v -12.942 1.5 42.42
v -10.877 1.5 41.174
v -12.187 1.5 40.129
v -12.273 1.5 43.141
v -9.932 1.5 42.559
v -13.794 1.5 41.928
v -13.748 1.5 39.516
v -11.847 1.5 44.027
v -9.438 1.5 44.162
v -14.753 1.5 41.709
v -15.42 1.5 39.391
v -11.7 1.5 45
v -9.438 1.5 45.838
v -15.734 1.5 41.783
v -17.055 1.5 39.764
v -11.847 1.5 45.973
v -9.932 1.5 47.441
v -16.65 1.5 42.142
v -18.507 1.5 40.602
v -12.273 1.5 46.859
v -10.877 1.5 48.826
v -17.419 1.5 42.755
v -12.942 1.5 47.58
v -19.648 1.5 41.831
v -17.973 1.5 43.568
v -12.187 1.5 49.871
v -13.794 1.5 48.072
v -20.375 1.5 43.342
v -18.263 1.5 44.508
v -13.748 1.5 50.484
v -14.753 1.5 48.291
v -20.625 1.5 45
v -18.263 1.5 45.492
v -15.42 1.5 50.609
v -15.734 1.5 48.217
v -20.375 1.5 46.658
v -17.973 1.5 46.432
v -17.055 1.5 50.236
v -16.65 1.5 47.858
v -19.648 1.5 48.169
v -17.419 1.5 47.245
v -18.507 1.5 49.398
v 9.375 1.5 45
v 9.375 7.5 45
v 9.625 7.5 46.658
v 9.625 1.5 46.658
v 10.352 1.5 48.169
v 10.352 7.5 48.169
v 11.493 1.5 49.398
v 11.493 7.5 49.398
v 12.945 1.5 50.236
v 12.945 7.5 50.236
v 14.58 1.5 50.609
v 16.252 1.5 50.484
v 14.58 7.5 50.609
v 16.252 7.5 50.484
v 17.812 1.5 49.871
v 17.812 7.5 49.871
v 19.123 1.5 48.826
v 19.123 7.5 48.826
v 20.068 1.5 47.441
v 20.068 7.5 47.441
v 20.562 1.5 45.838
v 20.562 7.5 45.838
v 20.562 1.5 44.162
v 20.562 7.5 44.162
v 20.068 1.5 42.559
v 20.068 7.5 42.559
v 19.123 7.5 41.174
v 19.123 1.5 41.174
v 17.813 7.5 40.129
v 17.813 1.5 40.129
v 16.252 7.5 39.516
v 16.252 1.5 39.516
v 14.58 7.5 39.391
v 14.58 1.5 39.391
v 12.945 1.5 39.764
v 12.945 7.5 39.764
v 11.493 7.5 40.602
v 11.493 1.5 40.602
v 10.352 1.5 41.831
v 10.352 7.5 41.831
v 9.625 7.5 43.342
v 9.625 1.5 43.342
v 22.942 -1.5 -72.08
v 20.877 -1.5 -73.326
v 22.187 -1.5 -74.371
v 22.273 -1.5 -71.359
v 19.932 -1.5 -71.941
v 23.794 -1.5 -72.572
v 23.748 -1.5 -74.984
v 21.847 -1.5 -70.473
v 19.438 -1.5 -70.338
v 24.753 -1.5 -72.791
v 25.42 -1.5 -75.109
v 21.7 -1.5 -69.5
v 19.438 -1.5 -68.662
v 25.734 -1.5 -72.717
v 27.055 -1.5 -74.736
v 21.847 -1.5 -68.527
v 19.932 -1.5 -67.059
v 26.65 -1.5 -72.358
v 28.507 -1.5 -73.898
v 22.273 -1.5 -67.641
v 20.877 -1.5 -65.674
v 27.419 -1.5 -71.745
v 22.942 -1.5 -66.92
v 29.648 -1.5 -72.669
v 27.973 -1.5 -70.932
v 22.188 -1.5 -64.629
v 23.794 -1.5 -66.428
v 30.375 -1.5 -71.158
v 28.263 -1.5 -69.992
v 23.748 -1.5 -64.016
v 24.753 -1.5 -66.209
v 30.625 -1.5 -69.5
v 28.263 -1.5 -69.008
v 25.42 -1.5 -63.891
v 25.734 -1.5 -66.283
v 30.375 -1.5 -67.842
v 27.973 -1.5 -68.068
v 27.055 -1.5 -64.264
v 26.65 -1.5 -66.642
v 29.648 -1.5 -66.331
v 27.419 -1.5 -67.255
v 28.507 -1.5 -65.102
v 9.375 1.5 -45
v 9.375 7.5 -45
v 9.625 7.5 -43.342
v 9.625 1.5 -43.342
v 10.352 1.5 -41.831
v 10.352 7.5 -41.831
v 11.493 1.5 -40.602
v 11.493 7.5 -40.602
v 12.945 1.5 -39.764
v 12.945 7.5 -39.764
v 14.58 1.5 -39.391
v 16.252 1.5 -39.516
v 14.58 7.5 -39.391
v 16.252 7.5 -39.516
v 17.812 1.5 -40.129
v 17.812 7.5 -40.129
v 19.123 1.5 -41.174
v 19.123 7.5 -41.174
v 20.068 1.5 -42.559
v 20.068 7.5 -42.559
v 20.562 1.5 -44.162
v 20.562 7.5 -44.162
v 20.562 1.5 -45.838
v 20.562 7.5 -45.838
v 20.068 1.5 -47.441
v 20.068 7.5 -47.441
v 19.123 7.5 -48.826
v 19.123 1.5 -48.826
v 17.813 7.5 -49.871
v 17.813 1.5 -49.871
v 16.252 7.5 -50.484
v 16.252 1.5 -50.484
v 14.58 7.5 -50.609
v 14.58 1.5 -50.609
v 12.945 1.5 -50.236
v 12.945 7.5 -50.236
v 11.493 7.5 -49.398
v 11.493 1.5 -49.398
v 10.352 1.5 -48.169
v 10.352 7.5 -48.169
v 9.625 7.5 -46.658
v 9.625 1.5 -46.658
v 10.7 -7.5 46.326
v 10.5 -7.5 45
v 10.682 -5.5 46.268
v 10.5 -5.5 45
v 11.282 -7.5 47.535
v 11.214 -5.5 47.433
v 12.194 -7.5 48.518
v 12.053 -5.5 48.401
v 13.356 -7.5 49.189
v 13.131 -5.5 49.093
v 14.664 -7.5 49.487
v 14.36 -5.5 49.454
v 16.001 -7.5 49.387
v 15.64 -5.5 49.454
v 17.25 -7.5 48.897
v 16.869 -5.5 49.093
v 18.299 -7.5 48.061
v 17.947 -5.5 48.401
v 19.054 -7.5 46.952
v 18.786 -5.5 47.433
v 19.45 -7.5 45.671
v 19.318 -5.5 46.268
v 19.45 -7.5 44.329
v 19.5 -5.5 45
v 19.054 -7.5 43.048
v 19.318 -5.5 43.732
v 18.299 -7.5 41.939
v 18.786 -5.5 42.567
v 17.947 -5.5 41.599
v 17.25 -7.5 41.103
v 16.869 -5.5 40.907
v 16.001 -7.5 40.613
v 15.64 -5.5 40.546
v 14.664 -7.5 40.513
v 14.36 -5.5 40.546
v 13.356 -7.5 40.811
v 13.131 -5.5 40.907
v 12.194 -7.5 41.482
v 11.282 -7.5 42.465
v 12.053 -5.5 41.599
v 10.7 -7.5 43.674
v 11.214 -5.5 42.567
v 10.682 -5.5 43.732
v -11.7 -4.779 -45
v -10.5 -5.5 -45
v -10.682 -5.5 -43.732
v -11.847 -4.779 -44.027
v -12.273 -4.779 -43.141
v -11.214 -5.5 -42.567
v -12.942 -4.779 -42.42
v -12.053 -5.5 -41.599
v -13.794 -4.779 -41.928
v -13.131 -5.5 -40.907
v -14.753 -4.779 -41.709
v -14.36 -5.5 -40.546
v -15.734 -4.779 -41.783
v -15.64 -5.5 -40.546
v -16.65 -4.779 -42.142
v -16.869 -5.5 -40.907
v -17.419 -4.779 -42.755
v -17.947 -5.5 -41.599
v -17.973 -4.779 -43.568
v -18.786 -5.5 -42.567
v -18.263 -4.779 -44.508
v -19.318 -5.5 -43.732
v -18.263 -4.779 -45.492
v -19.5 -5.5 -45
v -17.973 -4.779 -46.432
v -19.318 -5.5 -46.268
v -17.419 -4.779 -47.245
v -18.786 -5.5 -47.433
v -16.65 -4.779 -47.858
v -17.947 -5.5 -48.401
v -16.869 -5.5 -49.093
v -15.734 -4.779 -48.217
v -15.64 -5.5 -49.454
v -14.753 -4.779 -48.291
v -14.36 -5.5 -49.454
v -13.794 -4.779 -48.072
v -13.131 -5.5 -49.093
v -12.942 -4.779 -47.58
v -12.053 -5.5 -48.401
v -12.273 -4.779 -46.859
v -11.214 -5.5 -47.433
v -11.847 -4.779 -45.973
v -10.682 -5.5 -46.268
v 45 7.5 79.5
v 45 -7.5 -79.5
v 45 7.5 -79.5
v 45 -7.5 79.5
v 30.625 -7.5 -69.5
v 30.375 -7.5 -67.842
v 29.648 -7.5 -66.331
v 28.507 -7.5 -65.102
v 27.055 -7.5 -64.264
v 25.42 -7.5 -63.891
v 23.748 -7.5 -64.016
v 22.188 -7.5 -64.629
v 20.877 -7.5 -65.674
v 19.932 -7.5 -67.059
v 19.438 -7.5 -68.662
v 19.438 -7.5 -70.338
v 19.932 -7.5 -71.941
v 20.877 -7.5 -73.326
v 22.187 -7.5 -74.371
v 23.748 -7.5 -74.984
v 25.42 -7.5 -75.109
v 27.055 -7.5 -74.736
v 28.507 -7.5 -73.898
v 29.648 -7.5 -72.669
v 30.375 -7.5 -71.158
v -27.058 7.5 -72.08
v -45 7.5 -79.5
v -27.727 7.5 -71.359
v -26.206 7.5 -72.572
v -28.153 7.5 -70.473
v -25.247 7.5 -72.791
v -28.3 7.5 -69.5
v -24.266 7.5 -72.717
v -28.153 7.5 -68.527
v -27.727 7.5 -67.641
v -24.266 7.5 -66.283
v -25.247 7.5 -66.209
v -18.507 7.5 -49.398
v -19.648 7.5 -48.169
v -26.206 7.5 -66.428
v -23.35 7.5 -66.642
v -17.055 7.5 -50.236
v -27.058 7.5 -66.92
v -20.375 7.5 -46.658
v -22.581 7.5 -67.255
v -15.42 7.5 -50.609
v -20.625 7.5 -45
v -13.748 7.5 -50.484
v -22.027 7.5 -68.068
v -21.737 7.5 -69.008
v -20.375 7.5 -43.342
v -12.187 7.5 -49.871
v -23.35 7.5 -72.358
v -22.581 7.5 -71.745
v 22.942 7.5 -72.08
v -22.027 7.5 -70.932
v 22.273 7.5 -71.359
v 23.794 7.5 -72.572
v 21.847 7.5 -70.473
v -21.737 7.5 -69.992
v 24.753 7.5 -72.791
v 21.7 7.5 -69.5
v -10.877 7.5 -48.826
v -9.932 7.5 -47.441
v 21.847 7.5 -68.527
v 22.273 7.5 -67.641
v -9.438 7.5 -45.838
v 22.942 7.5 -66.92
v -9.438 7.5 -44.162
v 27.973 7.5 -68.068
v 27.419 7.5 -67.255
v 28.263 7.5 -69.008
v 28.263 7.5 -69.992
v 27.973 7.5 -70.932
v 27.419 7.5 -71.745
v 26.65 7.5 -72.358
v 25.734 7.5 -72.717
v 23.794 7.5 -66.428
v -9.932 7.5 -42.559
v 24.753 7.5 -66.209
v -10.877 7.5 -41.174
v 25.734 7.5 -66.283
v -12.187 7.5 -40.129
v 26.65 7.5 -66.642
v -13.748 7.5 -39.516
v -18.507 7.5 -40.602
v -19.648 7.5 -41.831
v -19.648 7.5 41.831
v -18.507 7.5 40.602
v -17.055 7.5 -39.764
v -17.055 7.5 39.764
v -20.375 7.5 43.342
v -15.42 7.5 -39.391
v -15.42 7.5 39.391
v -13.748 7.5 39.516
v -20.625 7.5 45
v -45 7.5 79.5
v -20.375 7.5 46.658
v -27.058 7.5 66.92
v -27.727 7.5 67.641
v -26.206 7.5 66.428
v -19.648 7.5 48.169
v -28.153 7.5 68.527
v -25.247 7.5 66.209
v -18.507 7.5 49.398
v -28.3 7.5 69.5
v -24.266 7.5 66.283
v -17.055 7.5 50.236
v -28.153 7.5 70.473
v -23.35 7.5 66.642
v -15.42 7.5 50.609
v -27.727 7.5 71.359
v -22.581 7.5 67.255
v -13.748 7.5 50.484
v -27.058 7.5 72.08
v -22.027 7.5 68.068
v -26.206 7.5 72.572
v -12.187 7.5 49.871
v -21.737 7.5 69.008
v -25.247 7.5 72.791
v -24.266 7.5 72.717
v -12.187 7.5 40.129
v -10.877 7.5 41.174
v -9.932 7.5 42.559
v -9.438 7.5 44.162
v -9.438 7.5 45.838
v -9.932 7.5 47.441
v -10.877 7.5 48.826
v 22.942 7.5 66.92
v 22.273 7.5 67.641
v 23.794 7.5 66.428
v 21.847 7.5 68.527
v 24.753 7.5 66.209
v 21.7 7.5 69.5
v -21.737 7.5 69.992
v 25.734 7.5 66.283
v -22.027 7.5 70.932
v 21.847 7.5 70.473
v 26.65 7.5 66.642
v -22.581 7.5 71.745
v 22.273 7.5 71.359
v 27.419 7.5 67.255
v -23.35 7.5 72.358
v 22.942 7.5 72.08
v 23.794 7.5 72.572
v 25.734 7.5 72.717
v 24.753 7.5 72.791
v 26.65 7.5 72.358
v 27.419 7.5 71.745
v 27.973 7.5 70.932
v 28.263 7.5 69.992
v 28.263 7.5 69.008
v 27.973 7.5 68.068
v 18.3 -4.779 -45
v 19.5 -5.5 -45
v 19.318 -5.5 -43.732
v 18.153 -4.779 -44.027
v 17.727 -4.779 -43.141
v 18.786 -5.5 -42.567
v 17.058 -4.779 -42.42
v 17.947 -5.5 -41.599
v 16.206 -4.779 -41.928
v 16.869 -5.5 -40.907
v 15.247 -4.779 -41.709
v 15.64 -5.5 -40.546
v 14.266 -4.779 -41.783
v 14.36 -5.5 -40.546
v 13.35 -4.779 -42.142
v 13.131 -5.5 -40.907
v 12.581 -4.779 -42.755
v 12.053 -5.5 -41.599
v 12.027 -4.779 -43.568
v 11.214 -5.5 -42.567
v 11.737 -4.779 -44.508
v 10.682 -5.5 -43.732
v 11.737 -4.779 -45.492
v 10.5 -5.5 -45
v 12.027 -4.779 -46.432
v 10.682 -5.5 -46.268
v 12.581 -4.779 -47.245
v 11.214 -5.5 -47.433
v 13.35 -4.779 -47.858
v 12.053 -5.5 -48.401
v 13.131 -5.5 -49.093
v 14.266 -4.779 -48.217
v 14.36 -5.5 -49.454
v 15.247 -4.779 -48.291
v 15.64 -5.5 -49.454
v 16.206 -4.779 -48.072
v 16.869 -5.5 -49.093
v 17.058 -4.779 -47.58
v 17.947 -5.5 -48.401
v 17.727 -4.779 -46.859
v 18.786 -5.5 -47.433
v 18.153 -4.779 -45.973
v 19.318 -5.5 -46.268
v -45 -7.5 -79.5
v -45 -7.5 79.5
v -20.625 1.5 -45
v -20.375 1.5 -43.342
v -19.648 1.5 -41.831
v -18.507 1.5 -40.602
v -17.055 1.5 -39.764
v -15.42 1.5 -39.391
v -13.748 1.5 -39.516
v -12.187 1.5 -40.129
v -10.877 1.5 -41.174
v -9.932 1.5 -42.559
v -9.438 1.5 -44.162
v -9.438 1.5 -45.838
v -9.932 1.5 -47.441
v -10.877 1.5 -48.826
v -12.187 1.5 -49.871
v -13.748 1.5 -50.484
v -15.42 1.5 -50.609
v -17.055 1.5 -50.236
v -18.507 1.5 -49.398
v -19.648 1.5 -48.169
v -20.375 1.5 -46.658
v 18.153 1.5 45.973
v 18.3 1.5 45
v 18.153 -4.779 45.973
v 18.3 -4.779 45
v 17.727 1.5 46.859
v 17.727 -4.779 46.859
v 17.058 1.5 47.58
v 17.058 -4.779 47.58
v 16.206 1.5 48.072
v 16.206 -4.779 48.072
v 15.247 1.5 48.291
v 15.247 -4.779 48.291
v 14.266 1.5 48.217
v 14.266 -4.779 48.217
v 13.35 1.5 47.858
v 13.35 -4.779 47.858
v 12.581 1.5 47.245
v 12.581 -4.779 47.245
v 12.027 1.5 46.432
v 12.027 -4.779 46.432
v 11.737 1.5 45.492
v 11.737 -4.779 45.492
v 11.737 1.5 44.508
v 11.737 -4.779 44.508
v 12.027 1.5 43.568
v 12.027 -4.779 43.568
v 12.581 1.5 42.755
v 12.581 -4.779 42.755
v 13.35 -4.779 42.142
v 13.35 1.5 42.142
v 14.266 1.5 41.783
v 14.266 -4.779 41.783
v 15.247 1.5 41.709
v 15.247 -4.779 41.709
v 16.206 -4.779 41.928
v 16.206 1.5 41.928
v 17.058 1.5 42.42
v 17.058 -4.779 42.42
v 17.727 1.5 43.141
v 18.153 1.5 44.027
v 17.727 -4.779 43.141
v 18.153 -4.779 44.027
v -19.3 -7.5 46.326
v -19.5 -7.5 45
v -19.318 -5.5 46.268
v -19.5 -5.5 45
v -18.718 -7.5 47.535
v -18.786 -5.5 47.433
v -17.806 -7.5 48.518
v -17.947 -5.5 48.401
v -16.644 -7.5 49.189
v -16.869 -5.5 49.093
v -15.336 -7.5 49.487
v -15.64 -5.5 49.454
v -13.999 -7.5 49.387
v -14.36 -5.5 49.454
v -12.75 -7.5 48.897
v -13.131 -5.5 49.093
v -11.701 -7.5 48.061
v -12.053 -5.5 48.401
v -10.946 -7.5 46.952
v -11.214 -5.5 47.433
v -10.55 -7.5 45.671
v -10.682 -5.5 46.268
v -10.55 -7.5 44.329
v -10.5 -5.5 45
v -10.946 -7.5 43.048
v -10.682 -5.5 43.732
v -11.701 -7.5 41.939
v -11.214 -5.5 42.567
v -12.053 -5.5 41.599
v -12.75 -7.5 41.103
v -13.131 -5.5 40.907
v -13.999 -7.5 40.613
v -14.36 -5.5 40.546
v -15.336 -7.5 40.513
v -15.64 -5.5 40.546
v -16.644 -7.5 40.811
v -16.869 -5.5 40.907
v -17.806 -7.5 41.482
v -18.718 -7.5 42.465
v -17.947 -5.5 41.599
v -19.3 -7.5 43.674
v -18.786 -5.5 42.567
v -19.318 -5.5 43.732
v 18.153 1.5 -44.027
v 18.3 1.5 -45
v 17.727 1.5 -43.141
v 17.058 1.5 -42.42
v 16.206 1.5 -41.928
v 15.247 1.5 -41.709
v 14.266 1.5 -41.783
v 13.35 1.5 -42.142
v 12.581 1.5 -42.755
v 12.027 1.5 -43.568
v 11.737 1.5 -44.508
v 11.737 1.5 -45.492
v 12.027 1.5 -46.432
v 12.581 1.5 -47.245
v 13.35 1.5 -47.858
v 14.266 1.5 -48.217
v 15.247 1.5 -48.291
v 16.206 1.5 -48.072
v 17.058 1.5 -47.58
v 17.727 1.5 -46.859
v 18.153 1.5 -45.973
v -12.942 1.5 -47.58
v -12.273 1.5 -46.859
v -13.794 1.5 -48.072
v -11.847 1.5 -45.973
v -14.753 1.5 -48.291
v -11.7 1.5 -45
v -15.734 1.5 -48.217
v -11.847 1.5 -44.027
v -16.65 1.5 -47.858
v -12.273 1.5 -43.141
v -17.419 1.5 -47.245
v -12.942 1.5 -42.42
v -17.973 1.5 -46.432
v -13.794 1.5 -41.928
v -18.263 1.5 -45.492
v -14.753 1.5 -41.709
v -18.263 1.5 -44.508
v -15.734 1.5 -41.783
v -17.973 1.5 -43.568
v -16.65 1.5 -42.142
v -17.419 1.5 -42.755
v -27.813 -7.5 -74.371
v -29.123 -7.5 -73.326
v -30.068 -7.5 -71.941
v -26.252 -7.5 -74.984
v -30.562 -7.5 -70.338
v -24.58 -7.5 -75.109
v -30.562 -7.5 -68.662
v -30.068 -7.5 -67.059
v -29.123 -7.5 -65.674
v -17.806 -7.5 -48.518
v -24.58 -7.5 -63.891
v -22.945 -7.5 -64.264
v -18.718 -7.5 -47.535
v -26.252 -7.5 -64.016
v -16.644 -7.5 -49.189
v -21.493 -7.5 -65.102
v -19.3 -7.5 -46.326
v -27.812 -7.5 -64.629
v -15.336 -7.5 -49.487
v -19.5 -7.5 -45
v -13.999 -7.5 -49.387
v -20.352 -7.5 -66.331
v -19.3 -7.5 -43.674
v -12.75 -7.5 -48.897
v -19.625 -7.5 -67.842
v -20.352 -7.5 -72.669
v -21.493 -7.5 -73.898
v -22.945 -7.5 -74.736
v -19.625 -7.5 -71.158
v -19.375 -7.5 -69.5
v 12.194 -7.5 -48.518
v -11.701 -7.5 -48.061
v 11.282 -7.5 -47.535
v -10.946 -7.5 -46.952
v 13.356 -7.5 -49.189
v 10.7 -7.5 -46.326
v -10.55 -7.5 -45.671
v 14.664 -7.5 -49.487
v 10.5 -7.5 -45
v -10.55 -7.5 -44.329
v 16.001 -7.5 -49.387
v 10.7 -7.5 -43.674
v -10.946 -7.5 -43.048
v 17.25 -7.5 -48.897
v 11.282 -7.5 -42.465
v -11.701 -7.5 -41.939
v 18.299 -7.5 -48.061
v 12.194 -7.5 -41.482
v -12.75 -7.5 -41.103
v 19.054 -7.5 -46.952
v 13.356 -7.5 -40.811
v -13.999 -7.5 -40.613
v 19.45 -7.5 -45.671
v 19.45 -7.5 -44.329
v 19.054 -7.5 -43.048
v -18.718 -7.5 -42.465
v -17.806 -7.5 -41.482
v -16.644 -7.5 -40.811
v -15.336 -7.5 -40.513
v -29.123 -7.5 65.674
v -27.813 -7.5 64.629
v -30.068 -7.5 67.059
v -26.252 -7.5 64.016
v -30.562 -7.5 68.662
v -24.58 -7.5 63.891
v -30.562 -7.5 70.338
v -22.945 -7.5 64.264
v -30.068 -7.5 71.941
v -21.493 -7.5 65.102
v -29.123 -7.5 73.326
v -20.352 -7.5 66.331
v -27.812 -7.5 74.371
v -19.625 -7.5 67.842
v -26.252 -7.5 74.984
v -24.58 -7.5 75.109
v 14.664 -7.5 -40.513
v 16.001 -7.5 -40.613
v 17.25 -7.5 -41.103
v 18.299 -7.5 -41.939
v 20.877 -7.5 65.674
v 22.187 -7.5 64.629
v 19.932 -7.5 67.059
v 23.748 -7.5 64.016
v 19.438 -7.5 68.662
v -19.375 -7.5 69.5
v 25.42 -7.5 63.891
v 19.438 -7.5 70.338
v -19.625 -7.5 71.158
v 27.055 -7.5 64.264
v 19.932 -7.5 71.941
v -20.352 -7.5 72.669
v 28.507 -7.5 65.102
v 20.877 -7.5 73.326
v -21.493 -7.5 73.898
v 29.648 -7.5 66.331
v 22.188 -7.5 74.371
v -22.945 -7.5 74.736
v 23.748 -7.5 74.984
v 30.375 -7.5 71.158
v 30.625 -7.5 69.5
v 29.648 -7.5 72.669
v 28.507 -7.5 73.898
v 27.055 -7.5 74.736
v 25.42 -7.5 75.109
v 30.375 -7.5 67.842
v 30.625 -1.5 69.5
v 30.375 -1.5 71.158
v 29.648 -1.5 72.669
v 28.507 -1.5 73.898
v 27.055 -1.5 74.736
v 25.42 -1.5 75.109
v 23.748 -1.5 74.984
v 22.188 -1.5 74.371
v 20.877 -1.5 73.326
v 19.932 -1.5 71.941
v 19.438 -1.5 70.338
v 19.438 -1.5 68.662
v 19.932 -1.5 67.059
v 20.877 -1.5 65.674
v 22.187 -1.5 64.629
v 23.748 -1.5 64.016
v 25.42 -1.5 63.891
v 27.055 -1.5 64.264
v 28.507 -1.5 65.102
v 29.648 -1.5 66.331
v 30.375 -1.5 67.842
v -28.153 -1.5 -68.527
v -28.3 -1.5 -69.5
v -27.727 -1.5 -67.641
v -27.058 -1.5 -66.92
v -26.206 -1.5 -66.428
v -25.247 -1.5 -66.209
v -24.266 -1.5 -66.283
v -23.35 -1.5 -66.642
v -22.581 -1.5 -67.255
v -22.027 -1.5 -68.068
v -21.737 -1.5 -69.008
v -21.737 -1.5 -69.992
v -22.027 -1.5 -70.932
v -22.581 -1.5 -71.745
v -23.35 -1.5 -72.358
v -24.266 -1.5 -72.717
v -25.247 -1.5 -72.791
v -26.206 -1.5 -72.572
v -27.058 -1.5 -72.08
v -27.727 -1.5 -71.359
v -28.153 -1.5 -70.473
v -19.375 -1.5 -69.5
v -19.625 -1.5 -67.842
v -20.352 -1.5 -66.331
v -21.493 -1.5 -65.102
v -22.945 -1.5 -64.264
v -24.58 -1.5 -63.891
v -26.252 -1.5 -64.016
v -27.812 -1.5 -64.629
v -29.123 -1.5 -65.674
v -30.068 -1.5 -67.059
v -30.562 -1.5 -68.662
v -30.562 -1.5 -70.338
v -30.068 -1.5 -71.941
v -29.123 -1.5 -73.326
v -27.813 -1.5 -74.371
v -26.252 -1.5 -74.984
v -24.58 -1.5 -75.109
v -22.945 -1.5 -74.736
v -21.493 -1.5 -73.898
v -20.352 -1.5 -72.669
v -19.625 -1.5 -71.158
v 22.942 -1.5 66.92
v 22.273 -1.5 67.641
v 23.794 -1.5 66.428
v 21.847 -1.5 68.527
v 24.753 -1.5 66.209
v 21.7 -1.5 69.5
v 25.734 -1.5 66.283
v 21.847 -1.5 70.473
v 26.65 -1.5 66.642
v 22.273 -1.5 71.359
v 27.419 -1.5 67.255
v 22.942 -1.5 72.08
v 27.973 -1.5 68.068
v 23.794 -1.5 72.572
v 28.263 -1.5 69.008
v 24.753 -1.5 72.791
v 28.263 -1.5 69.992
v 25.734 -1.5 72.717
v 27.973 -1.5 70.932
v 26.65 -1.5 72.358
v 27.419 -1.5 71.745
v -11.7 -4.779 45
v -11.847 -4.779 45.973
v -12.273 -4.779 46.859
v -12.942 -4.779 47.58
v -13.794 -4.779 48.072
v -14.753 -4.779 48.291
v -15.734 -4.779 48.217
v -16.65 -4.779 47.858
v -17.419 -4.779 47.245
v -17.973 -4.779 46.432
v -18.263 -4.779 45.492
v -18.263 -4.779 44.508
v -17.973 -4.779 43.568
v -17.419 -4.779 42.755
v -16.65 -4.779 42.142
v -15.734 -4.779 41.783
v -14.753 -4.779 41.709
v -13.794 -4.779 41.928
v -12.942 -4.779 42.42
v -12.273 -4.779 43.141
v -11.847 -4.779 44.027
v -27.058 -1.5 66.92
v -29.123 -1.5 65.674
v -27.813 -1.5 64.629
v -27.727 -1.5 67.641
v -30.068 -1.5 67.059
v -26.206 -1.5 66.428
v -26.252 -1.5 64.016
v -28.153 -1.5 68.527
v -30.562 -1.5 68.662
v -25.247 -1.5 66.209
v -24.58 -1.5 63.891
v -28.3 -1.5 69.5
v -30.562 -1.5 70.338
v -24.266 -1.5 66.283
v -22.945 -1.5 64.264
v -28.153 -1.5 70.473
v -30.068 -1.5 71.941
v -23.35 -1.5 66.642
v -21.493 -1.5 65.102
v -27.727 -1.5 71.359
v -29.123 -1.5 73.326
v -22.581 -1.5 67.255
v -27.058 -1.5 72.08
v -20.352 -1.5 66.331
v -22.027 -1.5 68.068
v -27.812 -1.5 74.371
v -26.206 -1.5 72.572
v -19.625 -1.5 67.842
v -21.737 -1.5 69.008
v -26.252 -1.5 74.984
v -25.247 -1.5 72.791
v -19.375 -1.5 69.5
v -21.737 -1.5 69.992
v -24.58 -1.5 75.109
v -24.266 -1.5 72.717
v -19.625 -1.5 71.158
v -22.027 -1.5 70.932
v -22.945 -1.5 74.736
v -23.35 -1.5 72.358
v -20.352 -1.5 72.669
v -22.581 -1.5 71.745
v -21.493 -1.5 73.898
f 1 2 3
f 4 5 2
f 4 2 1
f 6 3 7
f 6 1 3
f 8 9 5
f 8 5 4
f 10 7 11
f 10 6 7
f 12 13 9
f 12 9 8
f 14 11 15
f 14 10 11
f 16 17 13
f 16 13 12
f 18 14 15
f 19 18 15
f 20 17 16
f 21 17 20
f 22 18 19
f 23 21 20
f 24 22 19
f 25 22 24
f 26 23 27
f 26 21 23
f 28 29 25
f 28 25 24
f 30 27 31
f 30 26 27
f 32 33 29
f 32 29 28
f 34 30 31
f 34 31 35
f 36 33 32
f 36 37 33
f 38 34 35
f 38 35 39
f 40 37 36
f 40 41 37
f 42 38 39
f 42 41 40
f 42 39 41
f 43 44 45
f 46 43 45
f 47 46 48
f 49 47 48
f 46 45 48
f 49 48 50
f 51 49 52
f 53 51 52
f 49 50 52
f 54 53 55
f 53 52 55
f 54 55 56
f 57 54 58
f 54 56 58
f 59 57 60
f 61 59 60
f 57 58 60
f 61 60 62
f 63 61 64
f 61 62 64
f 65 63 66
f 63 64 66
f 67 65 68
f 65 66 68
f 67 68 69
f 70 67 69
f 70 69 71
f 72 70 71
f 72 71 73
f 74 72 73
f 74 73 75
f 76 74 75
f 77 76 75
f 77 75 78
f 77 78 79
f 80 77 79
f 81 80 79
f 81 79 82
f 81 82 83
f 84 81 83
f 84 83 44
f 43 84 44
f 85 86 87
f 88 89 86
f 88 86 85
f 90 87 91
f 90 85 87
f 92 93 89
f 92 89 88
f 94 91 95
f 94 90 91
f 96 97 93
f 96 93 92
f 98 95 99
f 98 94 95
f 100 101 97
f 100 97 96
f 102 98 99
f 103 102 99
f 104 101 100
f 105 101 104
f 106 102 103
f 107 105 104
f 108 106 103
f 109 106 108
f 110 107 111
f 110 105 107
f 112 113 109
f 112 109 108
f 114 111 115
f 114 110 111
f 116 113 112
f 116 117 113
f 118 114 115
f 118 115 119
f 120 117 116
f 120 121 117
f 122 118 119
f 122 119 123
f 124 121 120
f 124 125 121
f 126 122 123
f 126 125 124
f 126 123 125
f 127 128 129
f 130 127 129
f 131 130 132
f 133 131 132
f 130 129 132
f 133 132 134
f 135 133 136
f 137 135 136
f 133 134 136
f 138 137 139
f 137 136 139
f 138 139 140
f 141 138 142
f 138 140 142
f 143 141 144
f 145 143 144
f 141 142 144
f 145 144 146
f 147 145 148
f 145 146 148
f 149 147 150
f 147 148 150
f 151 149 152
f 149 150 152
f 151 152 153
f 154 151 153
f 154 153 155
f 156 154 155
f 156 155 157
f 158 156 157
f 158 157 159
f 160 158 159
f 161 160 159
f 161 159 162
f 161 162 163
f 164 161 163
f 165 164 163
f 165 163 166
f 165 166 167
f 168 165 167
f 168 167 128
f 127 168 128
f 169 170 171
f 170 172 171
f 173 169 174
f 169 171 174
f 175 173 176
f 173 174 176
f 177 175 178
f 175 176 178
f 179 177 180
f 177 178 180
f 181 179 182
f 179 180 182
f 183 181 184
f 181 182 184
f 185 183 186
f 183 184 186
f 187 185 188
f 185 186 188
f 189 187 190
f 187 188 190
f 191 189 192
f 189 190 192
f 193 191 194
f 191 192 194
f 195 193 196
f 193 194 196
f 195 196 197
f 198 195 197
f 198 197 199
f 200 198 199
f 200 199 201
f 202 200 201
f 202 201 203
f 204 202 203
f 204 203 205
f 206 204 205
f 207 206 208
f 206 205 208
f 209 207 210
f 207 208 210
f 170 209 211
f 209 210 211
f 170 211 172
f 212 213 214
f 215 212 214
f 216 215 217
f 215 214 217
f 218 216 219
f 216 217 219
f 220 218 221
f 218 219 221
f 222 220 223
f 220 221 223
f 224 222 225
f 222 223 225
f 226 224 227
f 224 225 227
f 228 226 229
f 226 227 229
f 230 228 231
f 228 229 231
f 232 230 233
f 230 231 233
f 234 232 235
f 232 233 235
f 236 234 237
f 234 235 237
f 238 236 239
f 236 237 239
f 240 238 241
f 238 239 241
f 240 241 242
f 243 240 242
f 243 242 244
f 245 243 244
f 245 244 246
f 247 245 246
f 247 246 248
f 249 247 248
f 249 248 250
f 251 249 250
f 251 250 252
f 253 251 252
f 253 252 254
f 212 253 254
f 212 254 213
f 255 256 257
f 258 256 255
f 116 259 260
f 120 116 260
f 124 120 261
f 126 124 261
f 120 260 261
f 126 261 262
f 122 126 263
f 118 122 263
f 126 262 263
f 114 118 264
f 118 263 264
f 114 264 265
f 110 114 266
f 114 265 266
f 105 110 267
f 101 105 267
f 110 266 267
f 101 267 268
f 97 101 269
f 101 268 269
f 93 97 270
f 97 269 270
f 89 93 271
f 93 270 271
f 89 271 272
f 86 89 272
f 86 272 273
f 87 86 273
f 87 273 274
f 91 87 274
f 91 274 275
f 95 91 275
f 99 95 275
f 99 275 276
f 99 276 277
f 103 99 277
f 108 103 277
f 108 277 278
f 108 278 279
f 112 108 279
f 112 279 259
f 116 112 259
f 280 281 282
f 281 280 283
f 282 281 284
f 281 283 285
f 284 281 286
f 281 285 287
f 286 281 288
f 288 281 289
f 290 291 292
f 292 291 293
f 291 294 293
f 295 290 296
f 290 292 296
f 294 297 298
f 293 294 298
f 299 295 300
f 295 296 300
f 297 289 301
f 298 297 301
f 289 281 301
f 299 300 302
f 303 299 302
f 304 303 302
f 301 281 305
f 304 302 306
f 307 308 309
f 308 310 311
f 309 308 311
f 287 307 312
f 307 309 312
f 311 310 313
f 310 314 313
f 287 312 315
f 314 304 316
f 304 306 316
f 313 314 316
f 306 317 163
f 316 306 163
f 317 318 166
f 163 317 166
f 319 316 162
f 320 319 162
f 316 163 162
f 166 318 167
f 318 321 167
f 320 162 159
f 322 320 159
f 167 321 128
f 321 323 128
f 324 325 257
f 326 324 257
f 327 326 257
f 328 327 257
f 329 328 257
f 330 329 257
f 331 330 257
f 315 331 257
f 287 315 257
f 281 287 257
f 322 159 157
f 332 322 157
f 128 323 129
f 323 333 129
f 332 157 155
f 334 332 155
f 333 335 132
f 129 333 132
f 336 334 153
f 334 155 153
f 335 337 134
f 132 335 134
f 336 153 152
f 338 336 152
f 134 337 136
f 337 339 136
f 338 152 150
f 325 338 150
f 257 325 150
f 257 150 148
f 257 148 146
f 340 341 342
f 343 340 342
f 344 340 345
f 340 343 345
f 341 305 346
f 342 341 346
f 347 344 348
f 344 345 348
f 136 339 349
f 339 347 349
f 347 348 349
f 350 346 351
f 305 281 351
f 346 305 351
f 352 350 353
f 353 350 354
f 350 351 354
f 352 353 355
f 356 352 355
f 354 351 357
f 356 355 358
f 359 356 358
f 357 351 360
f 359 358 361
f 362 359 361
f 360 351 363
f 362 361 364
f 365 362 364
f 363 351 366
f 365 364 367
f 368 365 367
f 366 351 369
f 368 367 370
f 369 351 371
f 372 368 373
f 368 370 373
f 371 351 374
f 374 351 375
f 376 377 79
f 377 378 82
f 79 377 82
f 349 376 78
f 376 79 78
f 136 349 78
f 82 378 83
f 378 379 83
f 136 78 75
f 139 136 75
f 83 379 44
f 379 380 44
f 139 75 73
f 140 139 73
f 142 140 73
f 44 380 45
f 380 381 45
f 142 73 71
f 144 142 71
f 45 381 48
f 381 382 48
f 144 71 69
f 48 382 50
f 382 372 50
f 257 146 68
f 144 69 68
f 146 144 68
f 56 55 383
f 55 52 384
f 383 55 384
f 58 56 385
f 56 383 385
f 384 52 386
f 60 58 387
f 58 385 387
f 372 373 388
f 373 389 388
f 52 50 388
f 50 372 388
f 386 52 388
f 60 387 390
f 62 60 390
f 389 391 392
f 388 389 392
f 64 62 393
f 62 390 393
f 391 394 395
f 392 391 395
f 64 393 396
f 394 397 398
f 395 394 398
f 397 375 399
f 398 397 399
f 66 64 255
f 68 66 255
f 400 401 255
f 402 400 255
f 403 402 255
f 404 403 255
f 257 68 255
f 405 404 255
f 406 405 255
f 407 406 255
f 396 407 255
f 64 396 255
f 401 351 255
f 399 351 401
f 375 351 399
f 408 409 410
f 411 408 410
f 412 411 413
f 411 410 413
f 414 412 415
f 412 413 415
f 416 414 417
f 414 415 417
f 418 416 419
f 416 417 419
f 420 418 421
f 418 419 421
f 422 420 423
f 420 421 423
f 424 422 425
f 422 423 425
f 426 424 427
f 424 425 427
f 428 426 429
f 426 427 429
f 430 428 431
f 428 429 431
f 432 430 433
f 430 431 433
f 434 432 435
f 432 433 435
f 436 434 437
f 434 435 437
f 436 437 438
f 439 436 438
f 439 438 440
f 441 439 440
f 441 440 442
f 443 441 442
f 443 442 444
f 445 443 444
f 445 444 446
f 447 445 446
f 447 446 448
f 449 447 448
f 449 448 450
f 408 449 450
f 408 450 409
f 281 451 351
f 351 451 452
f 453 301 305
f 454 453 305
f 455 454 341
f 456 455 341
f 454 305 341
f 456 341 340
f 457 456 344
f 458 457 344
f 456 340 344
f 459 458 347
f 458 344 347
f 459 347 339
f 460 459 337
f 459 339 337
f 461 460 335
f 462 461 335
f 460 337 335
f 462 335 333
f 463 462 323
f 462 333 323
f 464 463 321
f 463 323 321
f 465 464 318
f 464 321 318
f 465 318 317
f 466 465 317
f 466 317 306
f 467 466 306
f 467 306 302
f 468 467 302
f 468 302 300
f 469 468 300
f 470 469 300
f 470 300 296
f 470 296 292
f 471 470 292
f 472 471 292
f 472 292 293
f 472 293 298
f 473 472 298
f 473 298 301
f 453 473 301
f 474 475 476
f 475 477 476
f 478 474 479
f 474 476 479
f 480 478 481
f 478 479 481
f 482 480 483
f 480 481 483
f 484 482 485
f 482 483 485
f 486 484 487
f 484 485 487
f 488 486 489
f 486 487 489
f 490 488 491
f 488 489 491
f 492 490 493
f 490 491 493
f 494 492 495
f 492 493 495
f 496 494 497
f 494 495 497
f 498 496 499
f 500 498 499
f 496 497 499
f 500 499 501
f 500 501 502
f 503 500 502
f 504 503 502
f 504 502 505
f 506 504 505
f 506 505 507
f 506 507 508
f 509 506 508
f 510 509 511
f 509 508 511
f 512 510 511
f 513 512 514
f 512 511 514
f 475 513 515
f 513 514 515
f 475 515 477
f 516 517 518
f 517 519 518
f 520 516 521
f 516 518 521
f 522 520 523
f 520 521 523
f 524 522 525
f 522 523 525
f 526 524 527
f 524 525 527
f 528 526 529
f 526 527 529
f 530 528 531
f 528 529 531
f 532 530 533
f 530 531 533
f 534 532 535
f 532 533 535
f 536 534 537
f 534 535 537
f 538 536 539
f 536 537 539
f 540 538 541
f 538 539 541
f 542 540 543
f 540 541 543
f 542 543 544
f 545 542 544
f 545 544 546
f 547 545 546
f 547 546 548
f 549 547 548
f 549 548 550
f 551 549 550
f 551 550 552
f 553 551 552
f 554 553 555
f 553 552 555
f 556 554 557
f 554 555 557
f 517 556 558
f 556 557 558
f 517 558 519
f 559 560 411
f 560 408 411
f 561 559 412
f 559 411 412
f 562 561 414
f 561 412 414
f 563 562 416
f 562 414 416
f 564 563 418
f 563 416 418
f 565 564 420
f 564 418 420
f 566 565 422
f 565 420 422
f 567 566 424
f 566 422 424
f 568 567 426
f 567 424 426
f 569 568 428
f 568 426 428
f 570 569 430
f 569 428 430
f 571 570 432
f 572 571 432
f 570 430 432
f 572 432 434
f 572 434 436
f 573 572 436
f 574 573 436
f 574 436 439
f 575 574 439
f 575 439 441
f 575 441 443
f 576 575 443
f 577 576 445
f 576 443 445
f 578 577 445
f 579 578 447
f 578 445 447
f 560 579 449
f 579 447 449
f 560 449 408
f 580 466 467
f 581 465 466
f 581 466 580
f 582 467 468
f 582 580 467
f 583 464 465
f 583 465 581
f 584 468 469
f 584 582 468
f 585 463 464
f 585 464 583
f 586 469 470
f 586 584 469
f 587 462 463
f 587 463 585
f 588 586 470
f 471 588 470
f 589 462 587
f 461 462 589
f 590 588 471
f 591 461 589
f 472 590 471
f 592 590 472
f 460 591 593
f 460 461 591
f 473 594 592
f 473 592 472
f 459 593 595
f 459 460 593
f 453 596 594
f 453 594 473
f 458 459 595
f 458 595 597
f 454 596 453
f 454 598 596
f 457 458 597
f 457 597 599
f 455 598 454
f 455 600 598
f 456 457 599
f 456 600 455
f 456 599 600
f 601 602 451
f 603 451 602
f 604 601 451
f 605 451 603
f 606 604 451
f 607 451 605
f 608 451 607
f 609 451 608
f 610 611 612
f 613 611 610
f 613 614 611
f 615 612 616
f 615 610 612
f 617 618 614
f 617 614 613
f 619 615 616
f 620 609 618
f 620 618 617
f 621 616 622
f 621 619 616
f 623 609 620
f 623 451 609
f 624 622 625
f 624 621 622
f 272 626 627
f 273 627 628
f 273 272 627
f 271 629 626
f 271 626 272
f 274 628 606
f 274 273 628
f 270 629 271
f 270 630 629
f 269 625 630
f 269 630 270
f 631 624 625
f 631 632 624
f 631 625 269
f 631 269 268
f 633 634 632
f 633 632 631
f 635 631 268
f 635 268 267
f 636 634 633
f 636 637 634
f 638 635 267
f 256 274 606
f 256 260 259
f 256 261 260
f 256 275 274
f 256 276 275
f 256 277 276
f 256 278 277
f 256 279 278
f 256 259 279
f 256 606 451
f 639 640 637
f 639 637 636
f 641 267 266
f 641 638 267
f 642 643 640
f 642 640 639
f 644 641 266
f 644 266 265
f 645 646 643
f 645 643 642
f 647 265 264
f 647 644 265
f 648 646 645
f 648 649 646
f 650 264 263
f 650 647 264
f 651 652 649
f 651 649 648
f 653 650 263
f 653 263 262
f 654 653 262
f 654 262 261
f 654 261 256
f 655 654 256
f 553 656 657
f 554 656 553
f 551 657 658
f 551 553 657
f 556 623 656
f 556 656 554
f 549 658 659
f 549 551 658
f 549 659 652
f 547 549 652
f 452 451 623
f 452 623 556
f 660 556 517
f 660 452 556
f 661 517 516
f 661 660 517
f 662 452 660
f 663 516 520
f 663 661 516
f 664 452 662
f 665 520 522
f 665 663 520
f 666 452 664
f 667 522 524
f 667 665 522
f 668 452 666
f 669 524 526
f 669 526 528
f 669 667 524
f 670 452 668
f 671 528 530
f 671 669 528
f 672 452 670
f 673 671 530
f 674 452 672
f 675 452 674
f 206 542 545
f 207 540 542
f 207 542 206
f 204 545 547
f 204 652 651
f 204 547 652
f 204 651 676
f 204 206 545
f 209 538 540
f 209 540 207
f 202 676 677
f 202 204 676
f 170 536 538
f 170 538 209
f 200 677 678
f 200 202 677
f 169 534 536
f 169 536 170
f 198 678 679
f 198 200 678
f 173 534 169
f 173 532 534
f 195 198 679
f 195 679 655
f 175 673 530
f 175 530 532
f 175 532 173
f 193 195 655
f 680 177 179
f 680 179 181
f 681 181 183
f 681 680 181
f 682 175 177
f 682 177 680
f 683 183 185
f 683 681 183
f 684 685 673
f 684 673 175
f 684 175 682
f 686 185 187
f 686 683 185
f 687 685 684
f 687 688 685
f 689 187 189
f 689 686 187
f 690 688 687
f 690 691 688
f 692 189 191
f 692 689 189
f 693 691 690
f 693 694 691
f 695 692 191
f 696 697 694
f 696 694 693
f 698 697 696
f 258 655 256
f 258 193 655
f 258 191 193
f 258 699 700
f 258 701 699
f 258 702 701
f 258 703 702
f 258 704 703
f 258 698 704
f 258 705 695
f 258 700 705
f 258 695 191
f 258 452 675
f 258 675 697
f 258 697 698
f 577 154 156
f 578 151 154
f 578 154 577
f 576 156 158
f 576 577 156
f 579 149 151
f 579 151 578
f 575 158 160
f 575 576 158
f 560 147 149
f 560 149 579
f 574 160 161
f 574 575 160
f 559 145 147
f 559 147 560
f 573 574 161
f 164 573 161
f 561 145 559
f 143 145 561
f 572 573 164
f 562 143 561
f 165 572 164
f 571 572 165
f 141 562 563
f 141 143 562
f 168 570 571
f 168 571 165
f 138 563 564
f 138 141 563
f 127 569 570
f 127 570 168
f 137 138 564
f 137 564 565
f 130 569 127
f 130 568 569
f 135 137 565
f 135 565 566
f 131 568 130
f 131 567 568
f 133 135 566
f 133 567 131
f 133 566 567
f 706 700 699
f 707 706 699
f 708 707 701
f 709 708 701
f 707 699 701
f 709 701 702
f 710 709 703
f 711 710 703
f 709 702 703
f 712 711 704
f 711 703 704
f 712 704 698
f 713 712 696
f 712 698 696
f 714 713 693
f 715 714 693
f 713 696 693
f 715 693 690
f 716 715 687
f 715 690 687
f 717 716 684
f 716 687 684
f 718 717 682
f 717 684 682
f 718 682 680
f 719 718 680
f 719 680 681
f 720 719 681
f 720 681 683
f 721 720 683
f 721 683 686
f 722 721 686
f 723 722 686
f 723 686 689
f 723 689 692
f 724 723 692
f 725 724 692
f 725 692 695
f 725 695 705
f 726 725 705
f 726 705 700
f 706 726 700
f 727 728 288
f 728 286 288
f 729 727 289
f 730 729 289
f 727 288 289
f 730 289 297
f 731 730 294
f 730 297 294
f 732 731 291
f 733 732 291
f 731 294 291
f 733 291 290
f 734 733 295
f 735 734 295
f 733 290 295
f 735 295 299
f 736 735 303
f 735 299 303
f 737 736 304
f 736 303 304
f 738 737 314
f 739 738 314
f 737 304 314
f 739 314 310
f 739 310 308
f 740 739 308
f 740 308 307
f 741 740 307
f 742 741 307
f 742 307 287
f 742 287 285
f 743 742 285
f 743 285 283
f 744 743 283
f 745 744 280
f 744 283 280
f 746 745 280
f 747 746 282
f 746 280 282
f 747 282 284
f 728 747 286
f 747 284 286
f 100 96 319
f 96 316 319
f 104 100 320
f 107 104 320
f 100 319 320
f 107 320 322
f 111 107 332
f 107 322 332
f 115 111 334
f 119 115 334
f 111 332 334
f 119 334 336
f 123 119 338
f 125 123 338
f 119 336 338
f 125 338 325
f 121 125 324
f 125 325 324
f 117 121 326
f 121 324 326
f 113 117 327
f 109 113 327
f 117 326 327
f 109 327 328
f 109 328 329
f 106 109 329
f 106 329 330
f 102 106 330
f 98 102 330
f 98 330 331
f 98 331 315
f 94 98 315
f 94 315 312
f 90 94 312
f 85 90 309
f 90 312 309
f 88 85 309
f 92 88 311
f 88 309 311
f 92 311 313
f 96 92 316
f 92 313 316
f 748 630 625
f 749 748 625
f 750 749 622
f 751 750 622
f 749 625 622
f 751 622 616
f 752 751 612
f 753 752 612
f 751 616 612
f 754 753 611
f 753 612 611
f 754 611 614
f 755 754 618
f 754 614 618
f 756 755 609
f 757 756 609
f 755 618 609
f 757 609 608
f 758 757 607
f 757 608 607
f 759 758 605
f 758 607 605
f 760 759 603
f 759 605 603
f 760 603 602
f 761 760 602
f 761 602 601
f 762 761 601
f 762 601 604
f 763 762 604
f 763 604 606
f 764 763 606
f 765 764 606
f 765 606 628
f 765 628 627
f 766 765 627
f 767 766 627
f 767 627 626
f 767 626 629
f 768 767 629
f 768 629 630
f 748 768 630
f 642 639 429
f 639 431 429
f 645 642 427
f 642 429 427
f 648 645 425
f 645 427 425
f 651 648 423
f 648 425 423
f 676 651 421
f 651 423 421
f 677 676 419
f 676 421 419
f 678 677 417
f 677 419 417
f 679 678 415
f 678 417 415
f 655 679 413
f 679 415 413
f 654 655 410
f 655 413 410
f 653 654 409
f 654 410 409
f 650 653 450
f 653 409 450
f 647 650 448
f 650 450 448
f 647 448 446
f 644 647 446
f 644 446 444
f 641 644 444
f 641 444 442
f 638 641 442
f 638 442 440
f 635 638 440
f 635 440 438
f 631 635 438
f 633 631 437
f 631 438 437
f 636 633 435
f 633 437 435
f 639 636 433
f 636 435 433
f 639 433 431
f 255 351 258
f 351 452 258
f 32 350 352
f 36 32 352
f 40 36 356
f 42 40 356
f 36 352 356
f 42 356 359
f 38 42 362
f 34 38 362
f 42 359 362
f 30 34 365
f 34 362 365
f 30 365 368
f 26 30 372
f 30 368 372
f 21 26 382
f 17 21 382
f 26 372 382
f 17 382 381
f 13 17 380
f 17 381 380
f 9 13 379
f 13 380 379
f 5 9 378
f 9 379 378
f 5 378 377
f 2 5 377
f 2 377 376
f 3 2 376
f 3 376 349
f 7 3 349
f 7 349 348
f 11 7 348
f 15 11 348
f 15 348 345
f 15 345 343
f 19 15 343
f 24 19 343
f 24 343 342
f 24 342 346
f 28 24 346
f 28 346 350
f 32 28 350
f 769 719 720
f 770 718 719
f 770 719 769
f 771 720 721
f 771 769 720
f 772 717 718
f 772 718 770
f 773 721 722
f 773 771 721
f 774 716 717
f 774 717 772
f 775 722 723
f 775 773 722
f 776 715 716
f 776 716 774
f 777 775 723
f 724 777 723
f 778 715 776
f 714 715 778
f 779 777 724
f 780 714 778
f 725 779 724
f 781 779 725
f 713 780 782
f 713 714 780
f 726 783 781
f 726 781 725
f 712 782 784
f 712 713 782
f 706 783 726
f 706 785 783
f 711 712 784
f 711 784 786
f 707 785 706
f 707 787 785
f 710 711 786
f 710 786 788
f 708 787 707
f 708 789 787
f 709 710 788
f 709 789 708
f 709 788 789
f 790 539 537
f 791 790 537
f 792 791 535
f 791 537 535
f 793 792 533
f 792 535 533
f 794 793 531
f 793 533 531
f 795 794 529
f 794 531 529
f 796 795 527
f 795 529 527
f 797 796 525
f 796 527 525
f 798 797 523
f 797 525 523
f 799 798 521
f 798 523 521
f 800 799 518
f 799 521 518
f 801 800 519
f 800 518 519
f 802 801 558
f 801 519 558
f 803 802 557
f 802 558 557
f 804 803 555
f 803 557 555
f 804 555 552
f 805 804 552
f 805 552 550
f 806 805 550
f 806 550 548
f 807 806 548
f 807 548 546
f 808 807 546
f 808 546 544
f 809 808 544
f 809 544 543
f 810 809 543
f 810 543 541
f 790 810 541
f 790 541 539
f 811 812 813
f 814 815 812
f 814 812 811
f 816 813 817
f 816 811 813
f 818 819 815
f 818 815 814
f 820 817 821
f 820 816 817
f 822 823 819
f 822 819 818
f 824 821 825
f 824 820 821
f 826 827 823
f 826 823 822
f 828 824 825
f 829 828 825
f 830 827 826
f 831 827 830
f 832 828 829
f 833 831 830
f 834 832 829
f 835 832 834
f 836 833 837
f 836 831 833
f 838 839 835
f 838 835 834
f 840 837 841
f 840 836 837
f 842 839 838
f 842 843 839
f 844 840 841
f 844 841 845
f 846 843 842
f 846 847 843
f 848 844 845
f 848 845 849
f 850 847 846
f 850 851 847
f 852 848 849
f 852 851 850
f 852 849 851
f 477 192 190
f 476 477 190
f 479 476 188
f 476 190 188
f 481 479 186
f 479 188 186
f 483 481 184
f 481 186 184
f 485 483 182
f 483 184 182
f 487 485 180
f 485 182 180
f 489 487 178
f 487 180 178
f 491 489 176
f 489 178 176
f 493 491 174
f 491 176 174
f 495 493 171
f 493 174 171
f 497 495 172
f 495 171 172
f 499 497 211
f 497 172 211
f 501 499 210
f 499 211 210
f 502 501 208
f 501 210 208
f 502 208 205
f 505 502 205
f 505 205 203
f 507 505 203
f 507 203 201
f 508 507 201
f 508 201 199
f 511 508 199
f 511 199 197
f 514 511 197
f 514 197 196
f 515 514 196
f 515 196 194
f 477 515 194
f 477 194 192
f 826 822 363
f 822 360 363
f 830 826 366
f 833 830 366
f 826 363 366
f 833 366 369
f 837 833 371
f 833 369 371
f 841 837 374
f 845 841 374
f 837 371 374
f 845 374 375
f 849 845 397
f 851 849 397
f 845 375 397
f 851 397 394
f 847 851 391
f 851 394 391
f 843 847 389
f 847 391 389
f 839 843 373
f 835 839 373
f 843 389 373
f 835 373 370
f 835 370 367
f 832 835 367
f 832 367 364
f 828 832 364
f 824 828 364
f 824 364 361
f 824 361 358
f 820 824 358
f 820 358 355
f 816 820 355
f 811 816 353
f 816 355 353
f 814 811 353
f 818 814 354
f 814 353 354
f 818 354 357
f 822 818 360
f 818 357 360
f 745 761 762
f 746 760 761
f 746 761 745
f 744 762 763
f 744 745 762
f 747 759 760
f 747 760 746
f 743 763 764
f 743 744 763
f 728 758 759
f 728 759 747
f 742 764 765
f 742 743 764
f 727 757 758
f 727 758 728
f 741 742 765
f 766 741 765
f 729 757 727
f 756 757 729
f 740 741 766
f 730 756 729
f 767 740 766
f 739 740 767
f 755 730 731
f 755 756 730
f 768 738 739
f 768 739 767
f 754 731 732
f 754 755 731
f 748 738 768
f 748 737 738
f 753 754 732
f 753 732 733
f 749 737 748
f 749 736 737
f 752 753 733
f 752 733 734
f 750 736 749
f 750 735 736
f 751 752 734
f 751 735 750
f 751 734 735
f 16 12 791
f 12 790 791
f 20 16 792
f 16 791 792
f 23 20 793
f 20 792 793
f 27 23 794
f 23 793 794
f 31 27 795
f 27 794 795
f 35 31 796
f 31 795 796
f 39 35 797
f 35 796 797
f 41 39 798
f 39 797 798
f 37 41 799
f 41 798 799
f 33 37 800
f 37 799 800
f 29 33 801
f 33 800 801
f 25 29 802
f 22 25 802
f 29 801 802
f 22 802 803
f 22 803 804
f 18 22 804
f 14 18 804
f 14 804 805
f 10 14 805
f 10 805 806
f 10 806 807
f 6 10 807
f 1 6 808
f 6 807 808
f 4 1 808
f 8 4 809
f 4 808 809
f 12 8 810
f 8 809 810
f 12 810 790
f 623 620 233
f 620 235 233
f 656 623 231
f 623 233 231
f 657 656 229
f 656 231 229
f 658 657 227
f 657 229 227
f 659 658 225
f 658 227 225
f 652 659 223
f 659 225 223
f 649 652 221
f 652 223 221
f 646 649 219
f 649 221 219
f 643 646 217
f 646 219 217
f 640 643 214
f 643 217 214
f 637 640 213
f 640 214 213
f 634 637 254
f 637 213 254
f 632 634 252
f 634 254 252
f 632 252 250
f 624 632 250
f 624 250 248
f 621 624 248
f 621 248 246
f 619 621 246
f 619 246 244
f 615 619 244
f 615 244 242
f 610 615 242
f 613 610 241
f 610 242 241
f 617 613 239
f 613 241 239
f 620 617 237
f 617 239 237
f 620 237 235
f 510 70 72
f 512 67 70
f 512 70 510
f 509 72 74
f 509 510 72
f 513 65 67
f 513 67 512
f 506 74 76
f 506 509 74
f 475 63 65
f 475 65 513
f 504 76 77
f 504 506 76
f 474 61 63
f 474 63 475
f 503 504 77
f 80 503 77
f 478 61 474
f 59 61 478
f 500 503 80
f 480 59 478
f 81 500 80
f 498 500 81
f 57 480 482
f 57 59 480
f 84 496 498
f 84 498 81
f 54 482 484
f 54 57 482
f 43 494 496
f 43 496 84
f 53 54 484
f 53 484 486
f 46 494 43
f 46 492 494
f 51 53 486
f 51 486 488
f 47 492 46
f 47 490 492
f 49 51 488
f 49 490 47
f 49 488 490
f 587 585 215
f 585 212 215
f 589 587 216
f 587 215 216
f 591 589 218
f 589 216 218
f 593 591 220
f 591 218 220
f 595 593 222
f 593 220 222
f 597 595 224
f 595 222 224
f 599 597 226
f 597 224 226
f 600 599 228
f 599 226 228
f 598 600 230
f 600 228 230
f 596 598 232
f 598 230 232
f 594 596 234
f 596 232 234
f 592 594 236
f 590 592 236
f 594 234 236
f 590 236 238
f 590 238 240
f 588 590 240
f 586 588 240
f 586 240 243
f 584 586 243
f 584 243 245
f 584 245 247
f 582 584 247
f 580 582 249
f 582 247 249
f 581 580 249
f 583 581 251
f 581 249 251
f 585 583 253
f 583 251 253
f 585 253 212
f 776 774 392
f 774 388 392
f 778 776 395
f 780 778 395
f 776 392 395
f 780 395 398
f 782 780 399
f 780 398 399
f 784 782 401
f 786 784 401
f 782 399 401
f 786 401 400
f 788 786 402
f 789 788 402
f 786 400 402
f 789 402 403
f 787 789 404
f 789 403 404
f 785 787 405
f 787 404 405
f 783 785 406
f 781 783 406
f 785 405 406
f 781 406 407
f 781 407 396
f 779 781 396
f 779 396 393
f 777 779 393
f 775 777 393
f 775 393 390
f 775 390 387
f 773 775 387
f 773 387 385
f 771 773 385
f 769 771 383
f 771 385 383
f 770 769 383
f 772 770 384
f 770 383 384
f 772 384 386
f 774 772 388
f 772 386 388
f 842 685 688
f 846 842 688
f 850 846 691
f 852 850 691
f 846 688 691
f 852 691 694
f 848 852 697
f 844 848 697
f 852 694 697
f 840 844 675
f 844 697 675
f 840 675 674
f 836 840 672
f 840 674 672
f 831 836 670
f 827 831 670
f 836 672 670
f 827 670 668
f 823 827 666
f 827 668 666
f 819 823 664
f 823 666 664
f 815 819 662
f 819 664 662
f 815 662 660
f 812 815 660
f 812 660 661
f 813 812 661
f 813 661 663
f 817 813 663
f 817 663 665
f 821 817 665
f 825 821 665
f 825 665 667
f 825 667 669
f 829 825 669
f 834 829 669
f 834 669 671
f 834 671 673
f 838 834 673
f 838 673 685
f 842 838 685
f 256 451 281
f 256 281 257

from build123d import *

# Parameters (mm, degrees)
F0_W           = 90
F0_H           = 159
F1_DEPTH       = 7.5
F3_D           = 6.6
F3_CBORE_D     = 11.25
F3_CBORE_DEPTH = 6
F5_D           = 6.6
F5_CBORE_D     = 11.25
F5_CBORE_DEPTH = 6
F7_D           = 9
F7_DEPTH       = 2
F7_TIP         = 2.7038727856


with BuildPart() as f1:
    # F0 (on Front) → F1 (new body, symmetric)
    with BuildSketch(Plane.XZ):
        Rectangle(F0_W, F0_H)
    extrude(amount=F1_DEPTH, both=True)

    # F3 (through all)
    with Locations(Plane.XZ.offset(7.5)):
        with Locations((-25, 69.5), (25, 69.5), (-25, -69.5), (25, -69.5)):
            CounterBoreHole(F3_D / 2, F3_CBORE_D / 2, F3_CBORE_DEPTH)

    # F5 (through all)
    with Locations(Plane(origin=(0, 7.5, 0), x_dir=(-1, 0, 0), z_dir=(0, 1, 0))):
        with Locations((-15, 45), (15, 45), (15, -45), (-15, -45)):
            CounterBoreHole(F5_D / 2, F5_CBORE_D / 2, F5_CBORE_DEPTH)

    # F7
    with Locations(Plane.XZ.offset(7.5)):
        with Locations((-15, 45), (15, 45), (-15, -45), (15, -45)):
            Hole(F7_D / 2, depth=F7_DEPTH)
            with Locations((0, 0, -(F7_DEPTH + F7_TIP / 2))):  # 118° drill point
                Cone(0, F7_D / 2, F7_TIP, mode=Mode.SUBTRACT)


solid = f1.part
